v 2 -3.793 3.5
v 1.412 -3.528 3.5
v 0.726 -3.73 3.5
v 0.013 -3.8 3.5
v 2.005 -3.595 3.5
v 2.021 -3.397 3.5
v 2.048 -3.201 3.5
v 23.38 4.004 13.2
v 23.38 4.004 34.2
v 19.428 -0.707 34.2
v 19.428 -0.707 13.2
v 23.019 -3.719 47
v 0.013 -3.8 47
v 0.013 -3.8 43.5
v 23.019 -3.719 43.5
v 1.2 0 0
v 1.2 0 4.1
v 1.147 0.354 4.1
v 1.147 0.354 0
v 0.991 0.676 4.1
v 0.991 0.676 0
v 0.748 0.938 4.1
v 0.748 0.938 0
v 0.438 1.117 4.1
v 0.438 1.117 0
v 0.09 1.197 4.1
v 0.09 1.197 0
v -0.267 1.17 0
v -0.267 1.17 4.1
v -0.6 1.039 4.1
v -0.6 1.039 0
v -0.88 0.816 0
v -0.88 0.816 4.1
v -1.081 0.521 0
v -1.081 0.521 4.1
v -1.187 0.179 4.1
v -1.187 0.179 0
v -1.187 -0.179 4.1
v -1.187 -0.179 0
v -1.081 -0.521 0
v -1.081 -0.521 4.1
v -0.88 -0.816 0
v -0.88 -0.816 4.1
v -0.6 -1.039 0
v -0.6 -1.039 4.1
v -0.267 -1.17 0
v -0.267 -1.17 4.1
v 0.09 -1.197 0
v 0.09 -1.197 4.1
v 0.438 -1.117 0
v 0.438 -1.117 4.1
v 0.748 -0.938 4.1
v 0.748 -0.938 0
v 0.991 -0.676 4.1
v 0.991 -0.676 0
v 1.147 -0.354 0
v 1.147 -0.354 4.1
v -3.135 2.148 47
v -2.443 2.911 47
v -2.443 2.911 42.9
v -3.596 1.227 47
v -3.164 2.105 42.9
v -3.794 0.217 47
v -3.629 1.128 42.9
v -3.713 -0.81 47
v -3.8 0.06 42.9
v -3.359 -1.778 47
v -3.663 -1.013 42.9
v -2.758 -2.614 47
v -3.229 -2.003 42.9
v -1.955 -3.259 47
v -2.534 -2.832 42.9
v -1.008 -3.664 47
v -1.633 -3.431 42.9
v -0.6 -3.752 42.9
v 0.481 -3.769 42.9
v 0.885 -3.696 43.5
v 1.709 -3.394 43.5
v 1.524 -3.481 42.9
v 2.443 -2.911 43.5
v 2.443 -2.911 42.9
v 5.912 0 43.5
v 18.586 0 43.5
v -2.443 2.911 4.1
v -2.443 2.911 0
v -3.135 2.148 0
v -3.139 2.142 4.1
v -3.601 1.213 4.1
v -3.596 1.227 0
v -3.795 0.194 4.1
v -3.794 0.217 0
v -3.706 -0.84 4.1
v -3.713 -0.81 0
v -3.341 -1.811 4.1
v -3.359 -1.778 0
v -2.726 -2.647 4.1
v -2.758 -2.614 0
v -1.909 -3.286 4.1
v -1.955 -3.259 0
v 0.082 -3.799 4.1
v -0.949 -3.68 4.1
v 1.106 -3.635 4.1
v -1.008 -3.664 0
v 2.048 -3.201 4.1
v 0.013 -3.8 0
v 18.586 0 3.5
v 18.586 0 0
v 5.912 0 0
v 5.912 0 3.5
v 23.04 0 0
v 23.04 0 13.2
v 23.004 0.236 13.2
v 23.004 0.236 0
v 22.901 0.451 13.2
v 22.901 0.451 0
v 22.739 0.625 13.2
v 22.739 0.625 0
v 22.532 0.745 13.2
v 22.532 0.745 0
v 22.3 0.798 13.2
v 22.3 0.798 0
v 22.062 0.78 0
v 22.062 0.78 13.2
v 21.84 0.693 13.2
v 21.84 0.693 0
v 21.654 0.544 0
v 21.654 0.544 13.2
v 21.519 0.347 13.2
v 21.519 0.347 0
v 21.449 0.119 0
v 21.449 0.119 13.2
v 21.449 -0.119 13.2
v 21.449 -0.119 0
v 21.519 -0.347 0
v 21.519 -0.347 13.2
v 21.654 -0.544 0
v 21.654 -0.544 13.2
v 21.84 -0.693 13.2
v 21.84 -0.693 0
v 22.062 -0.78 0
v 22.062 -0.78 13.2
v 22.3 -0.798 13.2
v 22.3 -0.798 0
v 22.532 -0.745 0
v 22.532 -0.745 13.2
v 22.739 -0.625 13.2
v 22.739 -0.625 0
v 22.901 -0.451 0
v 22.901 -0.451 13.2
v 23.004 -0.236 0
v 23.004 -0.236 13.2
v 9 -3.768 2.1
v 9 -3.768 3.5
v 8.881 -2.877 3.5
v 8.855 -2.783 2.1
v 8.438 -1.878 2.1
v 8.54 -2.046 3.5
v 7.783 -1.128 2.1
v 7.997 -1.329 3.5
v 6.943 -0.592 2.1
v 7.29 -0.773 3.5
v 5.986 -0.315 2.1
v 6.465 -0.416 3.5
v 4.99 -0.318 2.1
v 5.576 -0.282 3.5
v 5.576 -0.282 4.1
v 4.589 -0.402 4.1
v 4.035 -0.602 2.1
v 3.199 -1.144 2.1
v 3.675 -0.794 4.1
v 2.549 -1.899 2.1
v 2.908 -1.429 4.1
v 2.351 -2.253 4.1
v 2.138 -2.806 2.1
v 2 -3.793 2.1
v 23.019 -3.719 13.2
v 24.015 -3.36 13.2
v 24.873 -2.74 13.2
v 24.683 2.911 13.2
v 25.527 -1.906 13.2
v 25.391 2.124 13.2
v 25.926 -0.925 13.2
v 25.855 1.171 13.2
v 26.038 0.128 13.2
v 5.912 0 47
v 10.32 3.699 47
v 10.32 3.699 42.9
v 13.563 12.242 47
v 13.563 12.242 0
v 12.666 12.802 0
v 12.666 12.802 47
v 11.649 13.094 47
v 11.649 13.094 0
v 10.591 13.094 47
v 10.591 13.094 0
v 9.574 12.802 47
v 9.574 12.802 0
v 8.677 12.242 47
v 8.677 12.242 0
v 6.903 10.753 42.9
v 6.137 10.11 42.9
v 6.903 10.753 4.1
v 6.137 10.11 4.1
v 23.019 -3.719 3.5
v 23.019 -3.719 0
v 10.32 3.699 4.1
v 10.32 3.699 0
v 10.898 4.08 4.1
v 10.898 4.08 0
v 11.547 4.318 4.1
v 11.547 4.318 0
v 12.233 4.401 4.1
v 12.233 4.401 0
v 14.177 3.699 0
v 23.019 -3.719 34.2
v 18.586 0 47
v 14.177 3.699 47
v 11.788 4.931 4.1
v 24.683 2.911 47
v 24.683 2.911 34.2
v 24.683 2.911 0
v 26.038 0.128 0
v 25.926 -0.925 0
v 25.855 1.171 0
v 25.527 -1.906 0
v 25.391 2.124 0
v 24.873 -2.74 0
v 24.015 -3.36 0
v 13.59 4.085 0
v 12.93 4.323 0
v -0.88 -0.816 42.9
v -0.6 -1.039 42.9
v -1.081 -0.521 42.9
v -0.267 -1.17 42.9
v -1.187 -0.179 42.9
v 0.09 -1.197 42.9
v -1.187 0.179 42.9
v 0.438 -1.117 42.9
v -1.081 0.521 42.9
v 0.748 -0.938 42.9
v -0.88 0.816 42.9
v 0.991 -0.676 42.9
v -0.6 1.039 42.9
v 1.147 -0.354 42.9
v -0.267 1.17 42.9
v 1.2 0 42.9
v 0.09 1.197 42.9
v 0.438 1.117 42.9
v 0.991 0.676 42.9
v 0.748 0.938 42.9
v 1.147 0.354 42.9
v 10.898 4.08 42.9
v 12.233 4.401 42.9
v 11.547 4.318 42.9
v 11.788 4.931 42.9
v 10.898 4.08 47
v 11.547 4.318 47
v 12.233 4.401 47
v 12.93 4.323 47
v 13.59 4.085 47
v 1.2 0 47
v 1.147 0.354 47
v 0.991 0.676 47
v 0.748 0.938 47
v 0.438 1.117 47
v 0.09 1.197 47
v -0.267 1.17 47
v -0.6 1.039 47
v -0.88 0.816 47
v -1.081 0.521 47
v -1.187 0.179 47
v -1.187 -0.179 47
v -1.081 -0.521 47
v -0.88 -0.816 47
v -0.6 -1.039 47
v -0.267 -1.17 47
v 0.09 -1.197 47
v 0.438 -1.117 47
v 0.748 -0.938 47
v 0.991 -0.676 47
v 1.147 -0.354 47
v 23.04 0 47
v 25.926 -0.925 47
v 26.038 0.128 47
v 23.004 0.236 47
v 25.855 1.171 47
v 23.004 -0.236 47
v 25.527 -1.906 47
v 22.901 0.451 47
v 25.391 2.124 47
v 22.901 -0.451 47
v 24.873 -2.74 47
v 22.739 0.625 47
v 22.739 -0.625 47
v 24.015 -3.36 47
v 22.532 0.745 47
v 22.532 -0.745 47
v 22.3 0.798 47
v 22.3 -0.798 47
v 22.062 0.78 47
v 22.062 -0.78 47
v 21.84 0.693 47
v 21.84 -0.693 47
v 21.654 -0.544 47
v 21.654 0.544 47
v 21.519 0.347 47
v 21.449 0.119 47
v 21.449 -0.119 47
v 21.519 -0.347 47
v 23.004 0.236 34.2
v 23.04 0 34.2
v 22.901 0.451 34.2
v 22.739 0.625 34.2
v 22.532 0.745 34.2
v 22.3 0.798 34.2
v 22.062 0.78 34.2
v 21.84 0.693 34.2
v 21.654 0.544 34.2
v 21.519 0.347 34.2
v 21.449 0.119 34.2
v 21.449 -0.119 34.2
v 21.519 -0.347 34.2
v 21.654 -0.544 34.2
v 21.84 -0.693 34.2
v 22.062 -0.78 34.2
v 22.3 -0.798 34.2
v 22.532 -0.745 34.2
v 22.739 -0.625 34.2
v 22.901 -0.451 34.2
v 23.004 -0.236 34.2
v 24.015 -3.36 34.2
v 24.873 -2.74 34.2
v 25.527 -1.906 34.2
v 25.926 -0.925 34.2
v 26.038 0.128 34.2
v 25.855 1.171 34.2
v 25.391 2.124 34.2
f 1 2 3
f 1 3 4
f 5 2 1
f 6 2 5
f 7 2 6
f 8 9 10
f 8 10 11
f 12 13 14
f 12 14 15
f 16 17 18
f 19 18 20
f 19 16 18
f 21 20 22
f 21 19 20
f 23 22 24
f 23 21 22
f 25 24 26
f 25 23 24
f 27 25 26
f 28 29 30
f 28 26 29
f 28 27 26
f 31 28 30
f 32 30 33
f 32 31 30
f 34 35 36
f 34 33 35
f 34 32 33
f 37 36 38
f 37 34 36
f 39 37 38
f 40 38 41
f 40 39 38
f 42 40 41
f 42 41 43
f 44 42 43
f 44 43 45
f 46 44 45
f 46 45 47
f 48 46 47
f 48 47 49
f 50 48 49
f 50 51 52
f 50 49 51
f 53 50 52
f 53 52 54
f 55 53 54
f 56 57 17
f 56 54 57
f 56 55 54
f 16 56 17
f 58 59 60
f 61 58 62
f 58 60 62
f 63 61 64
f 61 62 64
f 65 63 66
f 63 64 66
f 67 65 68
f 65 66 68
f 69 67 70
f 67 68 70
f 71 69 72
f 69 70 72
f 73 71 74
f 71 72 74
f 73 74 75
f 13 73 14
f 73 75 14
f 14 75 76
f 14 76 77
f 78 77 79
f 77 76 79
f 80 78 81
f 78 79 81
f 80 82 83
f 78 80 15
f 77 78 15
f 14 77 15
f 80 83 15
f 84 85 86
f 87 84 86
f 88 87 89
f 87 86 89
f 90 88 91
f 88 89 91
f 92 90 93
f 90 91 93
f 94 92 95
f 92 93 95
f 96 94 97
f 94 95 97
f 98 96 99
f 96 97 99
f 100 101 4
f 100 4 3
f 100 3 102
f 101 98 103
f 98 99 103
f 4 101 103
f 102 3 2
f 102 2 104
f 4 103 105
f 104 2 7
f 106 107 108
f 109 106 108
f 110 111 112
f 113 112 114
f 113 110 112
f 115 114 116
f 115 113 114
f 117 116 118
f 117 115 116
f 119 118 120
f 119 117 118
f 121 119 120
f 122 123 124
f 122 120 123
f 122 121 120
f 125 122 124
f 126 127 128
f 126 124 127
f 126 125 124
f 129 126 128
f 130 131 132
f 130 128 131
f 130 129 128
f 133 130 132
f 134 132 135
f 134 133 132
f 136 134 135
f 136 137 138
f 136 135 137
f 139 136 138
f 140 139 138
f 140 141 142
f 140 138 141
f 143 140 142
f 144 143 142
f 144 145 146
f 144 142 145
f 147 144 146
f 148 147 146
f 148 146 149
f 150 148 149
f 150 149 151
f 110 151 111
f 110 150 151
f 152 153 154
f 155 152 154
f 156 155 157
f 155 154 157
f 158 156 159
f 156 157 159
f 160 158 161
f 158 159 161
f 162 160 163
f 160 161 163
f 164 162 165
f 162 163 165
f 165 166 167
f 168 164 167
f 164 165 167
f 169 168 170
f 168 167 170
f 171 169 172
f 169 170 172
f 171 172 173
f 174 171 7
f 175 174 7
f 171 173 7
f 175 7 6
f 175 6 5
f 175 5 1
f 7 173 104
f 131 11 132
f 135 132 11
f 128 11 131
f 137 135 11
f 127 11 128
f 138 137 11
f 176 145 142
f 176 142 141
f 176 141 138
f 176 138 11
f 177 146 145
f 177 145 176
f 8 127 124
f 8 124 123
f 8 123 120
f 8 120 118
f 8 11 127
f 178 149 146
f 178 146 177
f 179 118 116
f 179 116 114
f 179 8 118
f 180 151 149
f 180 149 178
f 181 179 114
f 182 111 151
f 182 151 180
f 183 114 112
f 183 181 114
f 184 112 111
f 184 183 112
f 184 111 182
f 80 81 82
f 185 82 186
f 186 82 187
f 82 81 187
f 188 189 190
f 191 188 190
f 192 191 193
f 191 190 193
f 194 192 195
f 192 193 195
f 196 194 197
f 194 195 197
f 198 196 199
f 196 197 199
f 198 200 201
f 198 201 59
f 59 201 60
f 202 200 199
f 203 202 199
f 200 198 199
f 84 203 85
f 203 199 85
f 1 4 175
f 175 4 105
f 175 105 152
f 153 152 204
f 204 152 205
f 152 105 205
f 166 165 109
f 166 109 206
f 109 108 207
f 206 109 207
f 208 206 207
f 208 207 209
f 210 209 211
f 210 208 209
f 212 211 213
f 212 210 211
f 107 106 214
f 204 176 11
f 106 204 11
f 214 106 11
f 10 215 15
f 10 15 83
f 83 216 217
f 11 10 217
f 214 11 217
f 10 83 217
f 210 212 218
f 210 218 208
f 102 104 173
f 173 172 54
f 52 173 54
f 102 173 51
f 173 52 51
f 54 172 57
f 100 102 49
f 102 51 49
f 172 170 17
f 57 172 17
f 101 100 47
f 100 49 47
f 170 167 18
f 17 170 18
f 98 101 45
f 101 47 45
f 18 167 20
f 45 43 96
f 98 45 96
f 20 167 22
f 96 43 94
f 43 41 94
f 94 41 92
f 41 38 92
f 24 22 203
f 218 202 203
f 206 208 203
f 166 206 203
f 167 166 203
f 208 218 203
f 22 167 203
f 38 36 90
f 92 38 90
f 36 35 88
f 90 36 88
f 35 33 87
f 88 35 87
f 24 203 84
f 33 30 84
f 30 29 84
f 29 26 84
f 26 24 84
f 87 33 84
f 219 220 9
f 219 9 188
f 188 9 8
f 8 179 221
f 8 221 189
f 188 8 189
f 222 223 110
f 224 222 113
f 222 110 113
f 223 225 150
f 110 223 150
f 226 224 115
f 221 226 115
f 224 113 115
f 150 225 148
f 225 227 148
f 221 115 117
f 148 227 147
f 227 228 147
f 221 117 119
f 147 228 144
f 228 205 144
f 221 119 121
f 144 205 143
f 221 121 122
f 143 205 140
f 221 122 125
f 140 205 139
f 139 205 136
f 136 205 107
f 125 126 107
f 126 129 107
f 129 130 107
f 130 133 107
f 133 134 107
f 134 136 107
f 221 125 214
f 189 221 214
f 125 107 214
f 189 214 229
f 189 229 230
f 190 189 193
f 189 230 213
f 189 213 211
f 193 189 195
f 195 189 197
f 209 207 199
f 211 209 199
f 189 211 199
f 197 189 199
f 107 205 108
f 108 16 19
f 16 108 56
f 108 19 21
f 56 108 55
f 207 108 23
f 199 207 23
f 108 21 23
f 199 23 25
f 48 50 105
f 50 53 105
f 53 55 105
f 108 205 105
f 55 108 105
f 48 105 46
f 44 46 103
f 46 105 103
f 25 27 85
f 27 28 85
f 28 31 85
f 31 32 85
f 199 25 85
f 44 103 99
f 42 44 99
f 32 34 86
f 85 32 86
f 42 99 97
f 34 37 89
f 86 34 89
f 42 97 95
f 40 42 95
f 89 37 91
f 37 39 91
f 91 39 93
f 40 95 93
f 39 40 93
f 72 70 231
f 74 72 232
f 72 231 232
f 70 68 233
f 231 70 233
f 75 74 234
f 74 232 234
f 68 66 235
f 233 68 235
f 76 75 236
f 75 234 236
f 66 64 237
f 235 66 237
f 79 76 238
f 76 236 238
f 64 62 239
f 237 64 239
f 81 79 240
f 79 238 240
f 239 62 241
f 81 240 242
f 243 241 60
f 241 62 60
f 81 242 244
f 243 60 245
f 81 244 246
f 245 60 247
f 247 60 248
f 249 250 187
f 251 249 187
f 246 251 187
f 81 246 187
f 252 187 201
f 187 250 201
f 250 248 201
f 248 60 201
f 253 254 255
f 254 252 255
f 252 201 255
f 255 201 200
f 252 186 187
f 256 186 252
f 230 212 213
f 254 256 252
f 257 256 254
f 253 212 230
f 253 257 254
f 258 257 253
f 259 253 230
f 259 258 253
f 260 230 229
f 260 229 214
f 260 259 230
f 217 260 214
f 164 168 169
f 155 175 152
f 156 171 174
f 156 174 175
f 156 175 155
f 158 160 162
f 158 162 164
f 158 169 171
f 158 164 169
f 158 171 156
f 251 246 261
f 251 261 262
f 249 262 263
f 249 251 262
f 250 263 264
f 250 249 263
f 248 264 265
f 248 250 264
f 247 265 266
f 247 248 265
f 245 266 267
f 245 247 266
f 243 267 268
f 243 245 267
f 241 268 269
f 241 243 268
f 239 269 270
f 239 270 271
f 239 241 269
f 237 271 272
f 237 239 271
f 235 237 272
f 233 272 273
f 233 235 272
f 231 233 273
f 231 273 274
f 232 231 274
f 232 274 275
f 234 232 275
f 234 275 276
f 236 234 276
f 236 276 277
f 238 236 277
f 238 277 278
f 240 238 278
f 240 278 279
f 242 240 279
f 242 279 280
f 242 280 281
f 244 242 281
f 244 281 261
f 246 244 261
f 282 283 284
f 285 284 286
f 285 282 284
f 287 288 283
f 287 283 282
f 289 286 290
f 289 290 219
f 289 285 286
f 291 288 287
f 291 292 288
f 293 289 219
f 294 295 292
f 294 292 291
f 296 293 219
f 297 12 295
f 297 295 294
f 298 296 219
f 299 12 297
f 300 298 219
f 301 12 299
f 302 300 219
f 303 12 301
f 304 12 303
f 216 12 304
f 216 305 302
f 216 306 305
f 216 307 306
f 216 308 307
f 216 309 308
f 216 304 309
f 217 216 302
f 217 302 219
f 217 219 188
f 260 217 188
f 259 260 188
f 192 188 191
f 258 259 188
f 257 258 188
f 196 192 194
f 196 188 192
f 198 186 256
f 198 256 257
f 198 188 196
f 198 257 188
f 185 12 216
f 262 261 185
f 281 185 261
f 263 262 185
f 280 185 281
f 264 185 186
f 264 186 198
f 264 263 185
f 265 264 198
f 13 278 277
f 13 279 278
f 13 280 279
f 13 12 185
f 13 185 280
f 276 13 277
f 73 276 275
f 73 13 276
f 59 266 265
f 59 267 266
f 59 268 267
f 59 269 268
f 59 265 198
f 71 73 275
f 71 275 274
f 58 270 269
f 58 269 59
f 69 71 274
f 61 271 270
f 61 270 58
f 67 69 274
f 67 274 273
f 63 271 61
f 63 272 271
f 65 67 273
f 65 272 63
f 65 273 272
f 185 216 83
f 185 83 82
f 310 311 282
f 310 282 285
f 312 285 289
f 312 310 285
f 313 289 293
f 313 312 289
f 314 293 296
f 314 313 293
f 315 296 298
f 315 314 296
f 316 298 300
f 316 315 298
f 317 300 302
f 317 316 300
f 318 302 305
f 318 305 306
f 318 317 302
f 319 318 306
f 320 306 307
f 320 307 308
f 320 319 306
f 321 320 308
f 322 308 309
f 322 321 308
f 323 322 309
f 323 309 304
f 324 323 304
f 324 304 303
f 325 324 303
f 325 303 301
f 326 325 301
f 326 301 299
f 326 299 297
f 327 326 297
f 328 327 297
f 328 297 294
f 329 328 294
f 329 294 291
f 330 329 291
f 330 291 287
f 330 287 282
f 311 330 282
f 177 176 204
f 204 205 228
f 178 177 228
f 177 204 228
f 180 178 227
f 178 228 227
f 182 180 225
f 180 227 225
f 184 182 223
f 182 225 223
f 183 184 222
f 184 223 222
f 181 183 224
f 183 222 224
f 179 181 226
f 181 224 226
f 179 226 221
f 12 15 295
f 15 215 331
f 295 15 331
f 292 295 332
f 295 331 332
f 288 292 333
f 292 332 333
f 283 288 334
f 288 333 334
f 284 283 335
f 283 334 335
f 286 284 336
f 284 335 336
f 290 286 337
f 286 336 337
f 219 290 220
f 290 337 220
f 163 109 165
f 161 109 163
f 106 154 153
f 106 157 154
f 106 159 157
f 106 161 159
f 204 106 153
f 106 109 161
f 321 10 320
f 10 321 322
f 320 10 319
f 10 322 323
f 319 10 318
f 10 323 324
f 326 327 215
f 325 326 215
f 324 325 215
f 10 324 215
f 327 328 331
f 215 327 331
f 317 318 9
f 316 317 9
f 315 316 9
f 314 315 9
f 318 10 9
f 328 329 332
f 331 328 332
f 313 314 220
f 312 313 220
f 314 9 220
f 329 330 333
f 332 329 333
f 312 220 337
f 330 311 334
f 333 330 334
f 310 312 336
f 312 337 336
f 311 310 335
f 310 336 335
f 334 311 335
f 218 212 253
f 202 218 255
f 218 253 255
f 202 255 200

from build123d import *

# Parameters (mm, degrees)
SKETCH_1_R          = 1.2
SKETCH_1_R_2        = 0.8
EXTRUDE_3_DEPTH     = 47
SKETCH_6_W          = 5.5
SKETCH_6_H          = 21
CUT_EXTRUDE_4_DEPTH = 53.526968295
SKETCH_7_W          = 15
SKETCH_7_H          = 38.8
CUT_EXTRUDE_5_DEPTH = 56.899041136
CUT_EXTRUDE_6_DEPTH = 56.31273986
CUT_EXTRUDE_7_DEPTH = 56.31273986
SKETCH_10_W         = 38.8
SKETCH_10_H         = 7.6
CUT_EXTRUDE_8_DEPTH = 1
EXTRUDE_4_DEPTH     = 3.5
FILLET_1_R          = 3
SKETCH_12_R         = 3.5
CUT_EXTRUDE_9_DEPTH = 2


with BuildPart() as part:
    # 草图1 → 凸台-拉伸3 (new body)
    with BuildSketch(Plane.XY):
        with BuildLine():
            Line((8.677407083, 12.241756783), (-2.442592917, 2.910968884))
            ThreePointArc((-2.442592917, 2.910968884), (-2.910968884, -2.442592917), (2.442592917, -2.910968884))
            Line((2.442592917, -2.910968884), (11.12, 4.370240199))
            Line((11.12, 4.370240199), (19.797407083, -2.910968884))
            ThreePointArc((19.797407083, -2.910968884), (25.150968884, -2.442592917), (24.682592917, 2.910968884))
            Line((24.682592917, 2.910968884), (13.562592917, 12.241756783))
            ThreePointArc((13.562592917, 12.241756783), (11.12, 13.130787899), (8.677407083, 12.241756783))
        make_face()
        Circle(SKETCH_1_R, mode=Mode.SUBTRACT)
        with Locations((22.24, 0)):
            Circle(SKETCH_1_R_2, mode=Mode.SUBTRACT)
    extrude(amount=EXTRUDE_3_DEPTH)

    # 草图6 → 切除-拉伸4 (cut, through all)
    with BuildSketch(Plane(origin=(11.631625181, 13.862031097, 0), x_dir=(0.7660444431189771, -0.6427876096865404, 0), z_dir=(0.6427876096865404, 0.7660444431189771, 0))):
        with Locations((18.086828415, -23.7)):
            Rectangle(SKETCH_6_W, SKETCH_6_H)
    extrude(amount=-CUT_EXTRUDE_4_DEPTH, mode=Mode.SUBTRACT)

    # 草图7 → 切除-拉伸5 (cut, through all)
    with BuildSketch(Plane(origin=(-2.442592917, 2.910968884, 0), x_dir=(0.766044443118977, 0.6427876096865407, 0), z_dir=(-0.6427876096865407, 0.766044443118977, 0))):
        with Locations((3.7, -23.5)):
            Rectangle(SKETCH_7_W, SKETCH_7_H)
    extrude(amount=-CUT_EXTRUDE_5_DEPTH, mode=Mode.SUBTRACT)

    # 草图8 → 切除-拉伸6 (cut, through all)
    with BuildSketch(Plane.XY.offset(47)):
        with BuildLine():
            Line((19.03136264, -2.268181274), (23.018534178, -3.719393033))
            ThreePointArc((23.018534178, -3.719393033), (21.314980934, -3.685693928), (19.797407083, -2.910968884))
            Line((19.797407083, -2.910968884), (19.03136264, -2.268181274))
        make_face()
    extrude(amount=-CUT_EXTRUDE_6_DEPTH, mode=Mode.SUBTRACT)

    # 草图9 → 切除-拉伸7 (cut, through all)
    with BuildSketch(Plane.XY.offset(47)):
        Polygon((23.018534178, -3.719393033), (12.248842355, 5.317451403), (11.12, 4.370240199), (19.03136264, -2.268181274), align=None)
    extrude(amount=-CUT_EXTRUDE_7_DEPTH, mode=Mode.SUBTRACT)

    # 草图10 → 切除-拉伸8 (cut)
    with BuildSketch(Plane(origin=(8.579697763, 7.199221228, 0), x_dir=(0, 0, 1), z_dir=(-0.7660444431189769, -0.6427876096865407, 0))):
        with Locations((23.5, 0)):
            Rectangle(SKETCH_10_W, SKETCH_10_H)
    extrude(amount=-CUT_EXTRUDE_8_DEPTH, mode=Mode.SUBTRACT)

    # 草图11 → 凸台-拉伸4 (add)
    with BuildSketch(Plane.XY.offset(47)):
        Polygon((0.013310717, -3.799976687), (23.018534178, -3.719393033), (18.585934169, 0), (5.911750542, 0), align=None)
    extrude_4 = extrude(amount=-EXTRUDE_4_DEPTH)

    # 镜向2: 凸台-拉伸4 across plane
    add(extrude_4.mirror(Plane(origin=(0, 0, 23.5), x_dir=(1, 0, 0), z_dir=(0, 0, -1))))

    # 圆角1
    # the kernel refuses this fillet: 3 mm, written as the material it adds along each edge
    with BuildSketch(Plane(origin=(12.248842355, 5.317451403, 47), x_dir=(0.7660444431189768, -0.6427876096865407, 0), z_dir=(0, 0, -1))) as fillet_1_piece_1_section:
        with BuildLine():
            CenterArc((FILLET_1_R * 0.839099631177, FILLET_1_R), FILLET_1_R, 190, 80)
            Line((-FILLET_1_R * 0.145708121835, FILLET_1_R * 0.826351822333), (0, 0))
            Line((0, 0), (FILLET_1_R * 0.839099631177, 0))
        make_face()
    fillet_1_piece_1 = extrude(amount=47, mode=Mode.PRIVATE)
    fillet_1_piece_1 = split(fillet_1_piece_1, bisect_by=Plane(origin=(12.660529152, 4.67576924, 42.9), z_dir=(0, 0, 1)), keep=Keep.TOP, mode=Mode.PRIVATE)
    fillet_1_piece_1 = split(fillet_1_piece_1, bisect_by=Plane(origin=(12.274400975, 4.351769229, 44.95), z_dir=(0.7660444431189769, 0.6427876096865407, 0)), keep=Keep.TOP, mode=Mode.PRIVATE)
    add(fillet_1_piece_1)
    with BuildSketch(Plane(origin=(12.248842355, 5.317451403, 47), x_dir=(0.7660444431189768, -0.6427876096865407, 0), z_dir=(0, 0, -1))) as fillet_1_piece_2_section:
        with BuildLine():
            CenterArc((FILLET_1_R * 0.839099631177, FILLET_1_R), FILLET_1_R, 190, 80)
            Line((-FILLET_1_R * 0.145708121835, FILLET_1_R * 0.826351822333), (0, 0))
            Line((0, 0), (FILLET_1_R * 0.839099631177, 0))
        make_face()
    fillet_1_piece_2 = extrude(amount=47, mode=Mode.PRIVATE)
    fillet_1_piece_2 = split(fillet_1_piece_2, bisect_by=Plane(origin=(11.44751572, 4.445896391, 42.9), z_dir=(0, 0, 1)), keep=Keep.TOP, mode=Mode.PRIVATE)
    fillet_1_piece_2 = split(fillet_1_piece_2, bisect_by=Plane(origin=(11.886403327, 4.81416682, 44.95), z_dir=(-0.7660444431189769, -0.6427876096865407, 0)), keep=Keep.TOP, mode=Mode.PRIVATE)
    add(fillet_1_piece_2)
    with BuildSketch(Plane(origin=(12.248842355, 5.317451403, 47), x_dir=(0.7660444431189768, -0.6427876096865407, 0), z_dir=(0, 0, -1))) as fillet_1_piece_3_section:
        with BuildLine():
            CenterArc((FILLET_1_R * 0.839099631177, FILLET_1_R), FILLET_1_R, 190, 80)
            Line((-FILLET_1_R * 0.145708121835, FILLET_1_R * 0.826351822333), (0, 0))
            Line((0, 0), (FILLET_1_R * 0.839099631177, 0))
        make_face()
    fillet_1_piece_3 = extrude(amount=47, mode=Mode.PRIVATE)
    fillet_1_piece_3 = split(fillet_1_piece_3, bisect_by=Plane(origin=(12.660529152, 4.67576924, 42.9), z_dir=(0, 0, -1)), keep=Keep.TOP, mode=Mode.PRIVATE)
    fillet_1_piece_3 = split(fillet_1_piece_3, bisect_by=Plane(origin=(12.274400975, 4.351769229, 23.5), z_dir=(0.7660444431189769, 0.6427876096865407, 0)), keep=Keep.TOP, mode=Mode.PRIVATE)
    fillet_1_piece_3 = split(fillet_1_piece_3, bisect_by=Plane(origin=(12.660529152, 4.67576924, 4.1), z_dir=(0, 0, 1)), keep=Keep.TOP, mode=Mode.PRIVATE)
    add(fillet_1_piece_3)
    with BuildSketch(Plane(origin=(12.248842355, 5.317451403, 47), x_dir=(0.7660444431189768, -0.6427876096865407, 0), z_dir=(0, 0, -1))) as fillet_1_piece_4_section:
        with BuildLine():
            CenterArc((FILLET_1_R * 0.839099631177, FILLET_1_R), FILLET_1_R, 190, 80)
            Line((-FILLET_1_R * 0.145708121835, FILLET_1_R * 0.826351822333), (0, 0))
            Line((0, 0), (FILLET_1_R * 0.839099631177, 0))
        make_face()
    fillet_1_piece_4 = extrude(amount=47, mode=Mode.PRIVATE)
    fillet_1_piece_4 = split(fillet_1_piece_4, bisect_by=Plane(origin=(12.274400975, 4.351769229, 2.05), z_dir=(0.7660444431189769, 0.6427876096865407, 0)), keep=Keep.TOP, mode=Mode.PRIVATE)
    fillet_1_piece_4 = split(fillet_1_piece_4, bisect_by=Plane(origin=(12.660529152, 4.67576924, 4.1), z_dir=(0, 0, -1)), keep=Keep.TOP, mode=Mode.PRIVATE)
    add(fillet_1_piece_4)
    with BuildSketch(Plane(origin=(12.248842355, 5.317451403, 47), x_dir=(0.7660444431189768, -0.6427876096865407, 0), z_dir=(0, 0, -1))) as fillet_1_piece_5_section:
        with BuildLine():
            CenterArc((FILLET_1_R * 0.839099631177, FILLET_1_R), FILLET_1_R, 190, 80)
            Line((-FILLET_1_R * 0.145708121835, FILLET_1_R * 0.826351822333), (0, 0))
            Line((0, 0), (FILLET_1_R * 0.839099631177, 0))
        make_face()
    fillet_1_piece_5 = extrude(amount=47, mode=Mode.PRIVATE)
    fillet_1_piece_5 = split(fillet_1_piece_5, bisect_by=Plane(origin=(11.886403327, 4.81416682, 2.05), z_dir=(-0.7660444431189769, -0.6427876096865407, 0)), keep=Keep.TOP, mode=Mode.PRIVATE)
    fillet_1_piece_5 = split(fillet_1_piece_5, bisect_by=Plane(origin=(11.44751572, 4.445896391, 4.1), z_dir=(0, 0, -1)), keep=Keep.TOP, mode=Mode.PRIVATE)
    add(fillet_1_piece_5)

    # 草图12 → 切除-拉伸9 (cut)
    with BuildSketch(Plane.XY.offset(4.1)):
        with Locations((5.5, -3.780757684)):
            Circle(SKETCH_12_R)
    extrude(amount=-CUT_EXTRUDE_9_DEPTH, mode=Mode.SUBTRACT)


solid = part.part
